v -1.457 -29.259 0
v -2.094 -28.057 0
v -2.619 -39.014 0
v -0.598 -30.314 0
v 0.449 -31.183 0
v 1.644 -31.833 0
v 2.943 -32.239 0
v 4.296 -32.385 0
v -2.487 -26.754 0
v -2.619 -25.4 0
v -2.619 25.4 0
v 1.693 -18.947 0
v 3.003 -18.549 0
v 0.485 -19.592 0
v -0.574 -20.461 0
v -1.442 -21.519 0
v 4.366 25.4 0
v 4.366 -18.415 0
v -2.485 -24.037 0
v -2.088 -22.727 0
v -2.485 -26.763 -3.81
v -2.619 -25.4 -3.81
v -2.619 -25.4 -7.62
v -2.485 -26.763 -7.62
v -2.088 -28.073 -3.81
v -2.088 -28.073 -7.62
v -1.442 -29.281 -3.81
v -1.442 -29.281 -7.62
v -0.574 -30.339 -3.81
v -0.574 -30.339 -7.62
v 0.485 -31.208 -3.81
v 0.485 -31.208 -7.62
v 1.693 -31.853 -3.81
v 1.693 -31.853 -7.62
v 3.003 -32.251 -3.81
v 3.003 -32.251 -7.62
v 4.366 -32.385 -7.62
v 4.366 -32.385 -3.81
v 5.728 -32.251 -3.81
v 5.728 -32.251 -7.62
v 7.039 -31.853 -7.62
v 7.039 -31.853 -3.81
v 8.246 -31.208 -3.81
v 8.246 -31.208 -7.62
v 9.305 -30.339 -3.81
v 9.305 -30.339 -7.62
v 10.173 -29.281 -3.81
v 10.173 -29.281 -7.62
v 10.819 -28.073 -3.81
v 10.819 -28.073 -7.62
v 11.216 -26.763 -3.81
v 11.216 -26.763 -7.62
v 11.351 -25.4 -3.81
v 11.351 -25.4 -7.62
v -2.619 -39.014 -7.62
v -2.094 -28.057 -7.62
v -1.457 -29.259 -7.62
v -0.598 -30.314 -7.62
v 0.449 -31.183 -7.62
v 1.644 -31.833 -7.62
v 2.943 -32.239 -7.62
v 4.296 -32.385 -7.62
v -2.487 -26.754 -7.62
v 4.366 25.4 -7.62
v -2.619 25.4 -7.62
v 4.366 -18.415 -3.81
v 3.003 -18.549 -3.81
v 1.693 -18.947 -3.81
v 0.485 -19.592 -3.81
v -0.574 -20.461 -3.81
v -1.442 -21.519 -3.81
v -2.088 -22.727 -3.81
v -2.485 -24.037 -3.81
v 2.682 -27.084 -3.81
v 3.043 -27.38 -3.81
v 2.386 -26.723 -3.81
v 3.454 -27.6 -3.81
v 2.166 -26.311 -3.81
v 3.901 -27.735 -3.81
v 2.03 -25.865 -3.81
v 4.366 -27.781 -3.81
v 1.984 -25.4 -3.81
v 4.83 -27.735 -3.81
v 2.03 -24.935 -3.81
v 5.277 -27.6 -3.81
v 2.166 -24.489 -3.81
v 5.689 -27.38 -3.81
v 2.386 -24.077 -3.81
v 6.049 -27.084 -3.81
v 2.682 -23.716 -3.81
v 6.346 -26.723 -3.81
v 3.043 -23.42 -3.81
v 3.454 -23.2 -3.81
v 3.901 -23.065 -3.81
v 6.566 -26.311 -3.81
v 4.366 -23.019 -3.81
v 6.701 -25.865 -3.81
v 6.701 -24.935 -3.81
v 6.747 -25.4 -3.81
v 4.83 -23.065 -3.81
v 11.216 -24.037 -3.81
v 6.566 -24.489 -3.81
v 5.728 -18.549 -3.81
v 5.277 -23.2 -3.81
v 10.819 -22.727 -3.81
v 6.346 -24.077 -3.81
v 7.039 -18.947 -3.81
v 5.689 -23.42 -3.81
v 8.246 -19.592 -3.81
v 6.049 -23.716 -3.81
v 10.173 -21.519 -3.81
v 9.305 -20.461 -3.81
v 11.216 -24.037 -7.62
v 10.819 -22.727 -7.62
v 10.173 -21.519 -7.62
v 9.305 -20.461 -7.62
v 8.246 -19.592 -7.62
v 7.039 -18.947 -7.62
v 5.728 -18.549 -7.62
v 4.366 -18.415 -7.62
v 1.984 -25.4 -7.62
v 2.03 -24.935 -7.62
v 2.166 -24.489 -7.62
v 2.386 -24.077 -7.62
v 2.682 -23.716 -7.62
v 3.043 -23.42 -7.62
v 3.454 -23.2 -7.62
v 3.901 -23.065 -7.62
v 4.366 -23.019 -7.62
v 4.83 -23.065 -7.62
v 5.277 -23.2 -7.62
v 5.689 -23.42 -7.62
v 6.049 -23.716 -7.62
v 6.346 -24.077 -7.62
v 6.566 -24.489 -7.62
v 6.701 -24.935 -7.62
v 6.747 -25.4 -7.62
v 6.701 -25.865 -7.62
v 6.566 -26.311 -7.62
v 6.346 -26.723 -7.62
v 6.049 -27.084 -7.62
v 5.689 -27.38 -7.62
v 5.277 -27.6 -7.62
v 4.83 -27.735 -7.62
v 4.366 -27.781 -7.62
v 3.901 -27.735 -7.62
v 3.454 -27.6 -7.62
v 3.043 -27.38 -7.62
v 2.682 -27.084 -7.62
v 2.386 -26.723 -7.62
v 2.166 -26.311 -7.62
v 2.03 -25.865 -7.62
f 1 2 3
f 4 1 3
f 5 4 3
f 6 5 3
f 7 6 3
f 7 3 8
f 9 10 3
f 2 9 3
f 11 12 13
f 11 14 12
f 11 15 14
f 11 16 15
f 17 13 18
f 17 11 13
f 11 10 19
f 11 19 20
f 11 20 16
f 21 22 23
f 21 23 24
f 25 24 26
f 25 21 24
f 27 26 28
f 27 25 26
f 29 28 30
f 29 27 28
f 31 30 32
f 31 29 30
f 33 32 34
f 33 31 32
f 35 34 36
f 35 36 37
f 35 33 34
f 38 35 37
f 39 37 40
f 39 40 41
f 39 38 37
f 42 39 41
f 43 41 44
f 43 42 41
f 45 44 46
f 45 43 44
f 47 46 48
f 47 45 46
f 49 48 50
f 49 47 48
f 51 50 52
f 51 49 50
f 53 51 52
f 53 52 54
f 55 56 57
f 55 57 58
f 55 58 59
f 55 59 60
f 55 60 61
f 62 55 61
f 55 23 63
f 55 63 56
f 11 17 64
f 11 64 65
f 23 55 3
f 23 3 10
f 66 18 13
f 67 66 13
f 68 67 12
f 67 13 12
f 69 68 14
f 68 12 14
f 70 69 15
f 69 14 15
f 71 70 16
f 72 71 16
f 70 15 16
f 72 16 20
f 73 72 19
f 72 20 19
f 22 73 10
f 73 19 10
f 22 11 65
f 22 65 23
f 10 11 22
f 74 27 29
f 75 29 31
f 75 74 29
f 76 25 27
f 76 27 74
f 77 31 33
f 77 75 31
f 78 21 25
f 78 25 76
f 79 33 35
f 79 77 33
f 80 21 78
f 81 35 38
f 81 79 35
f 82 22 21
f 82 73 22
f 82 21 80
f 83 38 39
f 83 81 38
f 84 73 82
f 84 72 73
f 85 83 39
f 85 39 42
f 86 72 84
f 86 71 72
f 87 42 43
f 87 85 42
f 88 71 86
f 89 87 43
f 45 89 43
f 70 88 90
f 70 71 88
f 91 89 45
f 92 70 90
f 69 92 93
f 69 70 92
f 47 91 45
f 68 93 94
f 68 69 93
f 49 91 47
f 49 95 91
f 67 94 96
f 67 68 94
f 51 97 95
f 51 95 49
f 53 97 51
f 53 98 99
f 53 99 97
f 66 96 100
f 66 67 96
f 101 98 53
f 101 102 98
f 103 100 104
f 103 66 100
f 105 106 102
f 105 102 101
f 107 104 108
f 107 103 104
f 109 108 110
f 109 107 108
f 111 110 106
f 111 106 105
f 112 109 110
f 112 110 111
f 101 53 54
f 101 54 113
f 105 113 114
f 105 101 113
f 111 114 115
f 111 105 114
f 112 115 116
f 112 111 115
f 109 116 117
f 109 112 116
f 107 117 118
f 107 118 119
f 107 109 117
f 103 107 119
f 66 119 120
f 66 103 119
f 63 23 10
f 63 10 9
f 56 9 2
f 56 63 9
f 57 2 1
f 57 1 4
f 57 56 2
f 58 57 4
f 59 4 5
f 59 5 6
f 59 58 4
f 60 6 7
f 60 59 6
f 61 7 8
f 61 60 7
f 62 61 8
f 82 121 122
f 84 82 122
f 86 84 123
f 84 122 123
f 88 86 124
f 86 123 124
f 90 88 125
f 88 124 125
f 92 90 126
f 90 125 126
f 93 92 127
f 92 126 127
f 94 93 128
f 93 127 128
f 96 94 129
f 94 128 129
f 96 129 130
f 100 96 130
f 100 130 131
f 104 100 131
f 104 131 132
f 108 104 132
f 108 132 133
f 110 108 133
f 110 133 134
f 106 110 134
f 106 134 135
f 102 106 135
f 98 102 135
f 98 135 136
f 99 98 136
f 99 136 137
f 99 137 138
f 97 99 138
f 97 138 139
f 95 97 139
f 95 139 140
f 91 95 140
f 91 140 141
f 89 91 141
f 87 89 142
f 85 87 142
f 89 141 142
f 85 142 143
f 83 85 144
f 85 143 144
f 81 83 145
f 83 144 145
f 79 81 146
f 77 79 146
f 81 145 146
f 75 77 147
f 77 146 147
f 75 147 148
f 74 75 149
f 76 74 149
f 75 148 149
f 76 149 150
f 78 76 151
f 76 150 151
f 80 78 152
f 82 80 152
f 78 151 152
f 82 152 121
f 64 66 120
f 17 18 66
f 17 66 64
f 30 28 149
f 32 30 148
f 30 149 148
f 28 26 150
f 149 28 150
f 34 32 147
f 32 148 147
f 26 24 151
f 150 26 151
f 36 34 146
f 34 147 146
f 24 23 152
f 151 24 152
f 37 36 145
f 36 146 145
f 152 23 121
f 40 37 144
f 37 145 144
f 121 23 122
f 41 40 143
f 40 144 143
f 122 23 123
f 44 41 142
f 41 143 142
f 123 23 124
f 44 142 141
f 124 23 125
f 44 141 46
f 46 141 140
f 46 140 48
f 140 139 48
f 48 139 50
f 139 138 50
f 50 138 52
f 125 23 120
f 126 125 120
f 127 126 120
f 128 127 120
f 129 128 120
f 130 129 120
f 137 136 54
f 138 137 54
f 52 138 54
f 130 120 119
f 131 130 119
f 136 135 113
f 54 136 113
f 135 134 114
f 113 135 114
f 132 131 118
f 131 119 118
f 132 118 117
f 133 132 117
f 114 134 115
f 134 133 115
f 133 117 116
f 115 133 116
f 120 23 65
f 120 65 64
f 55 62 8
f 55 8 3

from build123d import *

# Parameters (mm, degrees)
F1_DEPTH = 7.62
F3_DEPTH = 3.81
F5_D     = 4.7625
F5_DEPTH = 12.7
F7_DEPTH = 7.62


with BuildPart() as f1:
    # F0 (on Top) → F1 (new body)
    with BuildSketch(Plane.XY):
        with BuildLine():
            Line((-2.619375, 25.4), (-2.619375, -25.4))
            ThreePointArc((-2.619375, -25.4), (-0.573515, -20.460859), (4.365625, -18.415))
            Line((4.365625, -18.415), (4.365625, 25.4))
            Line((4.365625, 25.4), (-2.619375, 25.4))
        make_face()
        with BuildLine():
            Line((4.365625, -18.415), (4.365625, -25.4))
            Line((4.365625, -25.4), (-2.619375, -25.4))
            ThreePointArc((-2.619375, -25.4), (4.365625, -32.385), (11.350625, -25.4))
            ThreePointArc((11.350625, -25.4), (9.304766, -20.460859), (4.365625, -18.415))
        make_face()
        with BuildLine():
            Line((-2.619375, -25.4), (4.365625, -25.4))
            Line((4.365625, -25.4), (4.365625, -18.415))
            ThreePointArc((4.365625, -18.415), (-0.573515, -20.460859), (-2.619375, -25.4))
        make_face()
    extrude(amount=-F1_DEPTH)

    # F2 (on face) → F3 (cut)
    with BuildSketch(Plane.XY):
        with BuildLine():
            ThreePointArc((-2.619375, -25.4), (4.365625, -32.385), (11.350625, -25.4))
            ThreePointArc((11.350625, -25.4), (9.304766, -20.460859), (4.365625, -18.415))
            ThreePointArc((4.365625, -18.415), (-0.573515, -20.460859), (-2.619375, -25.4))
        make_face()
    extrude(amount=-F3_DEPTH, mode=Mode.SUBTRACT)

    # F5
    with Locations(Plane.XY.offset(-3.81)):
        with Locations((4.365625, -25.4)):
            Hole(F5_D / 2, depth=F5_DEPTH)


with BuildPart() as f7:
    # F6 (on face) → F7 (new body)
    with BuildSketch(Plane(origin=(0, 0, -7.62), x_dir=(1, 0, 0), z_dir=(0, 0, -1))):
        with BuildLine():
            Line((-2.619375, 39.0144), (-2.619375, 25.4))
            ThreePointArc((-2.619375, 25.4), (-0.598223, 30.314309), (4.295567, 32.384649))
            Line((4.295567, 32.384649), (-2.619375, 39.0144))
        make_face()
    extrude(amount=-F7_DEPTH)


solid = Compound([f1.part, f7.part])
